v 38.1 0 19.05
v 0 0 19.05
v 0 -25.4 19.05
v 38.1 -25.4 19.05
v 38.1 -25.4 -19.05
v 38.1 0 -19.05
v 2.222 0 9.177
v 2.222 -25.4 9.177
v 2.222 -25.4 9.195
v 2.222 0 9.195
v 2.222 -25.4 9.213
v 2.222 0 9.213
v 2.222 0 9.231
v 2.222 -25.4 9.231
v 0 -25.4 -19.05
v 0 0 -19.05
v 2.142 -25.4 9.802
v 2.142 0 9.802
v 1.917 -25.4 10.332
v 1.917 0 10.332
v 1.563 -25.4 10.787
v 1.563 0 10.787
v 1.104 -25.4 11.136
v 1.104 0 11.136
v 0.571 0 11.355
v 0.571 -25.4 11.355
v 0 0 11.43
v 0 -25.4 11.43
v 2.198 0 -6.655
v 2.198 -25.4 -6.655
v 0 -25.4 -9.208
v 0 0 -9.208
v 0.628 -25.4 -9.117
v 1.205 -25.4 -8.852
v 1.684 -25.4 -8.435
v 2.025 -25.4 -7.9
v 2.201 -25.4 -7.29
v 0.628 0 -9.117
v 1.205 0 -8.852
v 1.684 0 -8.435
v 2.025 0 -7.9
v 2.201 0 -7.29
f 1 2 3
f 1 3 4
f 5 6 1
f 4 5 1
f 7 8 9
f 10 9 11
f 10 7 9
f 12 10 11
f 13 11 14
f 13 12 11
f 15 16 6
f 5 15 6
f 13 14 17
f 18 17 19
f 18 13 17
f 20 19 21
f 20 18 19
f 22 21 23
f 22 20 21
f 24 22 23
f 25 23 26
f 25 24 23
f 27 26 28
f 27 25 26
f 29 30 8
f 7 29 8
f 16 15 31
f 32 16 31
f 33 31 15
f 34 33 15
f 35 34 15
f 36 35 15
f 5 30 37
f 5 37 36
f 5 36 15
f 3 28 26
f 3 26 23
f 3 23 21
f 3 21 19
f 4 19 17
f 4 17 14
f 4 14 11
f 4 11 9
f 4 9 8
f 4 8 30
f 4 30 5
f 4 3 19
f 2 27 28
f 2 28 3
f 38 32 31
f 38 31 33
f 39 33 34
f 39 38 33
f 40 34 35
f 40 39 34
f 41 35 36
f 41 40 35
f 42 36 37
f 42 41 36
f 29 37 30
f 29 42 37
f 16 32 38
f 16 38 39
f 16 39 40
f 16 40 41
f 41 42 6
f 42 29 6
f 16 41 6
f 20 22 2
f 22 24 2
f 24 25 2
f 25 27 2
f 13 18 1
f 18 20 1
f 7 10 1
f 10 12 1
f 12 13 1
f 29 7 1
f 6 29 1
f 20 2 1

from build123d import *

# Parameters (mm, degrees)
F0_W     = 38.1
F0_H     = 38.1
F1_DEPTH = 25.4
F3_DEPTH = 25.401


with BuildPart() as f1:
    # F0 (on Front) → F1 (new body)
    with BuildSketch(Plane.XZ):
        with Locations((19.05, 0)):
            Rectangle(F0_W, F0_H)
    extrude(amount=F1_DEPTH)

    # F2 (on Front) → F3 (cut, through all)
    with BuildSketch(Plane.XZ):
        with BuildLine():
            Line((2.222374, 9.23115), (2.222291, 9.177008))
            ThreePointArc((2.222291, 9.177008), (2.222497, 9.204079), (2.222374, 9.23115))
        make_face()
        with BuildLine():
            Line((2.197918, -6.655362), (2.222291, 9.177008))
            Line((2.222291, 9.177008), (2.222374, 9.23115))
            ThreePointArc((2.222374, 9.23115), (1.563161, 10.787384), (0, 11.43))
            Line((0, 11.43), (0, -9.2075))
            ThreePointArc((0, -9.2075), (1.684061, -8.435325), (2.197918, -6.655362))
        make_face()
    extrude(amount=F3_DEPTH, mode=Mode.SUBTRACT)


solid = f1.part
